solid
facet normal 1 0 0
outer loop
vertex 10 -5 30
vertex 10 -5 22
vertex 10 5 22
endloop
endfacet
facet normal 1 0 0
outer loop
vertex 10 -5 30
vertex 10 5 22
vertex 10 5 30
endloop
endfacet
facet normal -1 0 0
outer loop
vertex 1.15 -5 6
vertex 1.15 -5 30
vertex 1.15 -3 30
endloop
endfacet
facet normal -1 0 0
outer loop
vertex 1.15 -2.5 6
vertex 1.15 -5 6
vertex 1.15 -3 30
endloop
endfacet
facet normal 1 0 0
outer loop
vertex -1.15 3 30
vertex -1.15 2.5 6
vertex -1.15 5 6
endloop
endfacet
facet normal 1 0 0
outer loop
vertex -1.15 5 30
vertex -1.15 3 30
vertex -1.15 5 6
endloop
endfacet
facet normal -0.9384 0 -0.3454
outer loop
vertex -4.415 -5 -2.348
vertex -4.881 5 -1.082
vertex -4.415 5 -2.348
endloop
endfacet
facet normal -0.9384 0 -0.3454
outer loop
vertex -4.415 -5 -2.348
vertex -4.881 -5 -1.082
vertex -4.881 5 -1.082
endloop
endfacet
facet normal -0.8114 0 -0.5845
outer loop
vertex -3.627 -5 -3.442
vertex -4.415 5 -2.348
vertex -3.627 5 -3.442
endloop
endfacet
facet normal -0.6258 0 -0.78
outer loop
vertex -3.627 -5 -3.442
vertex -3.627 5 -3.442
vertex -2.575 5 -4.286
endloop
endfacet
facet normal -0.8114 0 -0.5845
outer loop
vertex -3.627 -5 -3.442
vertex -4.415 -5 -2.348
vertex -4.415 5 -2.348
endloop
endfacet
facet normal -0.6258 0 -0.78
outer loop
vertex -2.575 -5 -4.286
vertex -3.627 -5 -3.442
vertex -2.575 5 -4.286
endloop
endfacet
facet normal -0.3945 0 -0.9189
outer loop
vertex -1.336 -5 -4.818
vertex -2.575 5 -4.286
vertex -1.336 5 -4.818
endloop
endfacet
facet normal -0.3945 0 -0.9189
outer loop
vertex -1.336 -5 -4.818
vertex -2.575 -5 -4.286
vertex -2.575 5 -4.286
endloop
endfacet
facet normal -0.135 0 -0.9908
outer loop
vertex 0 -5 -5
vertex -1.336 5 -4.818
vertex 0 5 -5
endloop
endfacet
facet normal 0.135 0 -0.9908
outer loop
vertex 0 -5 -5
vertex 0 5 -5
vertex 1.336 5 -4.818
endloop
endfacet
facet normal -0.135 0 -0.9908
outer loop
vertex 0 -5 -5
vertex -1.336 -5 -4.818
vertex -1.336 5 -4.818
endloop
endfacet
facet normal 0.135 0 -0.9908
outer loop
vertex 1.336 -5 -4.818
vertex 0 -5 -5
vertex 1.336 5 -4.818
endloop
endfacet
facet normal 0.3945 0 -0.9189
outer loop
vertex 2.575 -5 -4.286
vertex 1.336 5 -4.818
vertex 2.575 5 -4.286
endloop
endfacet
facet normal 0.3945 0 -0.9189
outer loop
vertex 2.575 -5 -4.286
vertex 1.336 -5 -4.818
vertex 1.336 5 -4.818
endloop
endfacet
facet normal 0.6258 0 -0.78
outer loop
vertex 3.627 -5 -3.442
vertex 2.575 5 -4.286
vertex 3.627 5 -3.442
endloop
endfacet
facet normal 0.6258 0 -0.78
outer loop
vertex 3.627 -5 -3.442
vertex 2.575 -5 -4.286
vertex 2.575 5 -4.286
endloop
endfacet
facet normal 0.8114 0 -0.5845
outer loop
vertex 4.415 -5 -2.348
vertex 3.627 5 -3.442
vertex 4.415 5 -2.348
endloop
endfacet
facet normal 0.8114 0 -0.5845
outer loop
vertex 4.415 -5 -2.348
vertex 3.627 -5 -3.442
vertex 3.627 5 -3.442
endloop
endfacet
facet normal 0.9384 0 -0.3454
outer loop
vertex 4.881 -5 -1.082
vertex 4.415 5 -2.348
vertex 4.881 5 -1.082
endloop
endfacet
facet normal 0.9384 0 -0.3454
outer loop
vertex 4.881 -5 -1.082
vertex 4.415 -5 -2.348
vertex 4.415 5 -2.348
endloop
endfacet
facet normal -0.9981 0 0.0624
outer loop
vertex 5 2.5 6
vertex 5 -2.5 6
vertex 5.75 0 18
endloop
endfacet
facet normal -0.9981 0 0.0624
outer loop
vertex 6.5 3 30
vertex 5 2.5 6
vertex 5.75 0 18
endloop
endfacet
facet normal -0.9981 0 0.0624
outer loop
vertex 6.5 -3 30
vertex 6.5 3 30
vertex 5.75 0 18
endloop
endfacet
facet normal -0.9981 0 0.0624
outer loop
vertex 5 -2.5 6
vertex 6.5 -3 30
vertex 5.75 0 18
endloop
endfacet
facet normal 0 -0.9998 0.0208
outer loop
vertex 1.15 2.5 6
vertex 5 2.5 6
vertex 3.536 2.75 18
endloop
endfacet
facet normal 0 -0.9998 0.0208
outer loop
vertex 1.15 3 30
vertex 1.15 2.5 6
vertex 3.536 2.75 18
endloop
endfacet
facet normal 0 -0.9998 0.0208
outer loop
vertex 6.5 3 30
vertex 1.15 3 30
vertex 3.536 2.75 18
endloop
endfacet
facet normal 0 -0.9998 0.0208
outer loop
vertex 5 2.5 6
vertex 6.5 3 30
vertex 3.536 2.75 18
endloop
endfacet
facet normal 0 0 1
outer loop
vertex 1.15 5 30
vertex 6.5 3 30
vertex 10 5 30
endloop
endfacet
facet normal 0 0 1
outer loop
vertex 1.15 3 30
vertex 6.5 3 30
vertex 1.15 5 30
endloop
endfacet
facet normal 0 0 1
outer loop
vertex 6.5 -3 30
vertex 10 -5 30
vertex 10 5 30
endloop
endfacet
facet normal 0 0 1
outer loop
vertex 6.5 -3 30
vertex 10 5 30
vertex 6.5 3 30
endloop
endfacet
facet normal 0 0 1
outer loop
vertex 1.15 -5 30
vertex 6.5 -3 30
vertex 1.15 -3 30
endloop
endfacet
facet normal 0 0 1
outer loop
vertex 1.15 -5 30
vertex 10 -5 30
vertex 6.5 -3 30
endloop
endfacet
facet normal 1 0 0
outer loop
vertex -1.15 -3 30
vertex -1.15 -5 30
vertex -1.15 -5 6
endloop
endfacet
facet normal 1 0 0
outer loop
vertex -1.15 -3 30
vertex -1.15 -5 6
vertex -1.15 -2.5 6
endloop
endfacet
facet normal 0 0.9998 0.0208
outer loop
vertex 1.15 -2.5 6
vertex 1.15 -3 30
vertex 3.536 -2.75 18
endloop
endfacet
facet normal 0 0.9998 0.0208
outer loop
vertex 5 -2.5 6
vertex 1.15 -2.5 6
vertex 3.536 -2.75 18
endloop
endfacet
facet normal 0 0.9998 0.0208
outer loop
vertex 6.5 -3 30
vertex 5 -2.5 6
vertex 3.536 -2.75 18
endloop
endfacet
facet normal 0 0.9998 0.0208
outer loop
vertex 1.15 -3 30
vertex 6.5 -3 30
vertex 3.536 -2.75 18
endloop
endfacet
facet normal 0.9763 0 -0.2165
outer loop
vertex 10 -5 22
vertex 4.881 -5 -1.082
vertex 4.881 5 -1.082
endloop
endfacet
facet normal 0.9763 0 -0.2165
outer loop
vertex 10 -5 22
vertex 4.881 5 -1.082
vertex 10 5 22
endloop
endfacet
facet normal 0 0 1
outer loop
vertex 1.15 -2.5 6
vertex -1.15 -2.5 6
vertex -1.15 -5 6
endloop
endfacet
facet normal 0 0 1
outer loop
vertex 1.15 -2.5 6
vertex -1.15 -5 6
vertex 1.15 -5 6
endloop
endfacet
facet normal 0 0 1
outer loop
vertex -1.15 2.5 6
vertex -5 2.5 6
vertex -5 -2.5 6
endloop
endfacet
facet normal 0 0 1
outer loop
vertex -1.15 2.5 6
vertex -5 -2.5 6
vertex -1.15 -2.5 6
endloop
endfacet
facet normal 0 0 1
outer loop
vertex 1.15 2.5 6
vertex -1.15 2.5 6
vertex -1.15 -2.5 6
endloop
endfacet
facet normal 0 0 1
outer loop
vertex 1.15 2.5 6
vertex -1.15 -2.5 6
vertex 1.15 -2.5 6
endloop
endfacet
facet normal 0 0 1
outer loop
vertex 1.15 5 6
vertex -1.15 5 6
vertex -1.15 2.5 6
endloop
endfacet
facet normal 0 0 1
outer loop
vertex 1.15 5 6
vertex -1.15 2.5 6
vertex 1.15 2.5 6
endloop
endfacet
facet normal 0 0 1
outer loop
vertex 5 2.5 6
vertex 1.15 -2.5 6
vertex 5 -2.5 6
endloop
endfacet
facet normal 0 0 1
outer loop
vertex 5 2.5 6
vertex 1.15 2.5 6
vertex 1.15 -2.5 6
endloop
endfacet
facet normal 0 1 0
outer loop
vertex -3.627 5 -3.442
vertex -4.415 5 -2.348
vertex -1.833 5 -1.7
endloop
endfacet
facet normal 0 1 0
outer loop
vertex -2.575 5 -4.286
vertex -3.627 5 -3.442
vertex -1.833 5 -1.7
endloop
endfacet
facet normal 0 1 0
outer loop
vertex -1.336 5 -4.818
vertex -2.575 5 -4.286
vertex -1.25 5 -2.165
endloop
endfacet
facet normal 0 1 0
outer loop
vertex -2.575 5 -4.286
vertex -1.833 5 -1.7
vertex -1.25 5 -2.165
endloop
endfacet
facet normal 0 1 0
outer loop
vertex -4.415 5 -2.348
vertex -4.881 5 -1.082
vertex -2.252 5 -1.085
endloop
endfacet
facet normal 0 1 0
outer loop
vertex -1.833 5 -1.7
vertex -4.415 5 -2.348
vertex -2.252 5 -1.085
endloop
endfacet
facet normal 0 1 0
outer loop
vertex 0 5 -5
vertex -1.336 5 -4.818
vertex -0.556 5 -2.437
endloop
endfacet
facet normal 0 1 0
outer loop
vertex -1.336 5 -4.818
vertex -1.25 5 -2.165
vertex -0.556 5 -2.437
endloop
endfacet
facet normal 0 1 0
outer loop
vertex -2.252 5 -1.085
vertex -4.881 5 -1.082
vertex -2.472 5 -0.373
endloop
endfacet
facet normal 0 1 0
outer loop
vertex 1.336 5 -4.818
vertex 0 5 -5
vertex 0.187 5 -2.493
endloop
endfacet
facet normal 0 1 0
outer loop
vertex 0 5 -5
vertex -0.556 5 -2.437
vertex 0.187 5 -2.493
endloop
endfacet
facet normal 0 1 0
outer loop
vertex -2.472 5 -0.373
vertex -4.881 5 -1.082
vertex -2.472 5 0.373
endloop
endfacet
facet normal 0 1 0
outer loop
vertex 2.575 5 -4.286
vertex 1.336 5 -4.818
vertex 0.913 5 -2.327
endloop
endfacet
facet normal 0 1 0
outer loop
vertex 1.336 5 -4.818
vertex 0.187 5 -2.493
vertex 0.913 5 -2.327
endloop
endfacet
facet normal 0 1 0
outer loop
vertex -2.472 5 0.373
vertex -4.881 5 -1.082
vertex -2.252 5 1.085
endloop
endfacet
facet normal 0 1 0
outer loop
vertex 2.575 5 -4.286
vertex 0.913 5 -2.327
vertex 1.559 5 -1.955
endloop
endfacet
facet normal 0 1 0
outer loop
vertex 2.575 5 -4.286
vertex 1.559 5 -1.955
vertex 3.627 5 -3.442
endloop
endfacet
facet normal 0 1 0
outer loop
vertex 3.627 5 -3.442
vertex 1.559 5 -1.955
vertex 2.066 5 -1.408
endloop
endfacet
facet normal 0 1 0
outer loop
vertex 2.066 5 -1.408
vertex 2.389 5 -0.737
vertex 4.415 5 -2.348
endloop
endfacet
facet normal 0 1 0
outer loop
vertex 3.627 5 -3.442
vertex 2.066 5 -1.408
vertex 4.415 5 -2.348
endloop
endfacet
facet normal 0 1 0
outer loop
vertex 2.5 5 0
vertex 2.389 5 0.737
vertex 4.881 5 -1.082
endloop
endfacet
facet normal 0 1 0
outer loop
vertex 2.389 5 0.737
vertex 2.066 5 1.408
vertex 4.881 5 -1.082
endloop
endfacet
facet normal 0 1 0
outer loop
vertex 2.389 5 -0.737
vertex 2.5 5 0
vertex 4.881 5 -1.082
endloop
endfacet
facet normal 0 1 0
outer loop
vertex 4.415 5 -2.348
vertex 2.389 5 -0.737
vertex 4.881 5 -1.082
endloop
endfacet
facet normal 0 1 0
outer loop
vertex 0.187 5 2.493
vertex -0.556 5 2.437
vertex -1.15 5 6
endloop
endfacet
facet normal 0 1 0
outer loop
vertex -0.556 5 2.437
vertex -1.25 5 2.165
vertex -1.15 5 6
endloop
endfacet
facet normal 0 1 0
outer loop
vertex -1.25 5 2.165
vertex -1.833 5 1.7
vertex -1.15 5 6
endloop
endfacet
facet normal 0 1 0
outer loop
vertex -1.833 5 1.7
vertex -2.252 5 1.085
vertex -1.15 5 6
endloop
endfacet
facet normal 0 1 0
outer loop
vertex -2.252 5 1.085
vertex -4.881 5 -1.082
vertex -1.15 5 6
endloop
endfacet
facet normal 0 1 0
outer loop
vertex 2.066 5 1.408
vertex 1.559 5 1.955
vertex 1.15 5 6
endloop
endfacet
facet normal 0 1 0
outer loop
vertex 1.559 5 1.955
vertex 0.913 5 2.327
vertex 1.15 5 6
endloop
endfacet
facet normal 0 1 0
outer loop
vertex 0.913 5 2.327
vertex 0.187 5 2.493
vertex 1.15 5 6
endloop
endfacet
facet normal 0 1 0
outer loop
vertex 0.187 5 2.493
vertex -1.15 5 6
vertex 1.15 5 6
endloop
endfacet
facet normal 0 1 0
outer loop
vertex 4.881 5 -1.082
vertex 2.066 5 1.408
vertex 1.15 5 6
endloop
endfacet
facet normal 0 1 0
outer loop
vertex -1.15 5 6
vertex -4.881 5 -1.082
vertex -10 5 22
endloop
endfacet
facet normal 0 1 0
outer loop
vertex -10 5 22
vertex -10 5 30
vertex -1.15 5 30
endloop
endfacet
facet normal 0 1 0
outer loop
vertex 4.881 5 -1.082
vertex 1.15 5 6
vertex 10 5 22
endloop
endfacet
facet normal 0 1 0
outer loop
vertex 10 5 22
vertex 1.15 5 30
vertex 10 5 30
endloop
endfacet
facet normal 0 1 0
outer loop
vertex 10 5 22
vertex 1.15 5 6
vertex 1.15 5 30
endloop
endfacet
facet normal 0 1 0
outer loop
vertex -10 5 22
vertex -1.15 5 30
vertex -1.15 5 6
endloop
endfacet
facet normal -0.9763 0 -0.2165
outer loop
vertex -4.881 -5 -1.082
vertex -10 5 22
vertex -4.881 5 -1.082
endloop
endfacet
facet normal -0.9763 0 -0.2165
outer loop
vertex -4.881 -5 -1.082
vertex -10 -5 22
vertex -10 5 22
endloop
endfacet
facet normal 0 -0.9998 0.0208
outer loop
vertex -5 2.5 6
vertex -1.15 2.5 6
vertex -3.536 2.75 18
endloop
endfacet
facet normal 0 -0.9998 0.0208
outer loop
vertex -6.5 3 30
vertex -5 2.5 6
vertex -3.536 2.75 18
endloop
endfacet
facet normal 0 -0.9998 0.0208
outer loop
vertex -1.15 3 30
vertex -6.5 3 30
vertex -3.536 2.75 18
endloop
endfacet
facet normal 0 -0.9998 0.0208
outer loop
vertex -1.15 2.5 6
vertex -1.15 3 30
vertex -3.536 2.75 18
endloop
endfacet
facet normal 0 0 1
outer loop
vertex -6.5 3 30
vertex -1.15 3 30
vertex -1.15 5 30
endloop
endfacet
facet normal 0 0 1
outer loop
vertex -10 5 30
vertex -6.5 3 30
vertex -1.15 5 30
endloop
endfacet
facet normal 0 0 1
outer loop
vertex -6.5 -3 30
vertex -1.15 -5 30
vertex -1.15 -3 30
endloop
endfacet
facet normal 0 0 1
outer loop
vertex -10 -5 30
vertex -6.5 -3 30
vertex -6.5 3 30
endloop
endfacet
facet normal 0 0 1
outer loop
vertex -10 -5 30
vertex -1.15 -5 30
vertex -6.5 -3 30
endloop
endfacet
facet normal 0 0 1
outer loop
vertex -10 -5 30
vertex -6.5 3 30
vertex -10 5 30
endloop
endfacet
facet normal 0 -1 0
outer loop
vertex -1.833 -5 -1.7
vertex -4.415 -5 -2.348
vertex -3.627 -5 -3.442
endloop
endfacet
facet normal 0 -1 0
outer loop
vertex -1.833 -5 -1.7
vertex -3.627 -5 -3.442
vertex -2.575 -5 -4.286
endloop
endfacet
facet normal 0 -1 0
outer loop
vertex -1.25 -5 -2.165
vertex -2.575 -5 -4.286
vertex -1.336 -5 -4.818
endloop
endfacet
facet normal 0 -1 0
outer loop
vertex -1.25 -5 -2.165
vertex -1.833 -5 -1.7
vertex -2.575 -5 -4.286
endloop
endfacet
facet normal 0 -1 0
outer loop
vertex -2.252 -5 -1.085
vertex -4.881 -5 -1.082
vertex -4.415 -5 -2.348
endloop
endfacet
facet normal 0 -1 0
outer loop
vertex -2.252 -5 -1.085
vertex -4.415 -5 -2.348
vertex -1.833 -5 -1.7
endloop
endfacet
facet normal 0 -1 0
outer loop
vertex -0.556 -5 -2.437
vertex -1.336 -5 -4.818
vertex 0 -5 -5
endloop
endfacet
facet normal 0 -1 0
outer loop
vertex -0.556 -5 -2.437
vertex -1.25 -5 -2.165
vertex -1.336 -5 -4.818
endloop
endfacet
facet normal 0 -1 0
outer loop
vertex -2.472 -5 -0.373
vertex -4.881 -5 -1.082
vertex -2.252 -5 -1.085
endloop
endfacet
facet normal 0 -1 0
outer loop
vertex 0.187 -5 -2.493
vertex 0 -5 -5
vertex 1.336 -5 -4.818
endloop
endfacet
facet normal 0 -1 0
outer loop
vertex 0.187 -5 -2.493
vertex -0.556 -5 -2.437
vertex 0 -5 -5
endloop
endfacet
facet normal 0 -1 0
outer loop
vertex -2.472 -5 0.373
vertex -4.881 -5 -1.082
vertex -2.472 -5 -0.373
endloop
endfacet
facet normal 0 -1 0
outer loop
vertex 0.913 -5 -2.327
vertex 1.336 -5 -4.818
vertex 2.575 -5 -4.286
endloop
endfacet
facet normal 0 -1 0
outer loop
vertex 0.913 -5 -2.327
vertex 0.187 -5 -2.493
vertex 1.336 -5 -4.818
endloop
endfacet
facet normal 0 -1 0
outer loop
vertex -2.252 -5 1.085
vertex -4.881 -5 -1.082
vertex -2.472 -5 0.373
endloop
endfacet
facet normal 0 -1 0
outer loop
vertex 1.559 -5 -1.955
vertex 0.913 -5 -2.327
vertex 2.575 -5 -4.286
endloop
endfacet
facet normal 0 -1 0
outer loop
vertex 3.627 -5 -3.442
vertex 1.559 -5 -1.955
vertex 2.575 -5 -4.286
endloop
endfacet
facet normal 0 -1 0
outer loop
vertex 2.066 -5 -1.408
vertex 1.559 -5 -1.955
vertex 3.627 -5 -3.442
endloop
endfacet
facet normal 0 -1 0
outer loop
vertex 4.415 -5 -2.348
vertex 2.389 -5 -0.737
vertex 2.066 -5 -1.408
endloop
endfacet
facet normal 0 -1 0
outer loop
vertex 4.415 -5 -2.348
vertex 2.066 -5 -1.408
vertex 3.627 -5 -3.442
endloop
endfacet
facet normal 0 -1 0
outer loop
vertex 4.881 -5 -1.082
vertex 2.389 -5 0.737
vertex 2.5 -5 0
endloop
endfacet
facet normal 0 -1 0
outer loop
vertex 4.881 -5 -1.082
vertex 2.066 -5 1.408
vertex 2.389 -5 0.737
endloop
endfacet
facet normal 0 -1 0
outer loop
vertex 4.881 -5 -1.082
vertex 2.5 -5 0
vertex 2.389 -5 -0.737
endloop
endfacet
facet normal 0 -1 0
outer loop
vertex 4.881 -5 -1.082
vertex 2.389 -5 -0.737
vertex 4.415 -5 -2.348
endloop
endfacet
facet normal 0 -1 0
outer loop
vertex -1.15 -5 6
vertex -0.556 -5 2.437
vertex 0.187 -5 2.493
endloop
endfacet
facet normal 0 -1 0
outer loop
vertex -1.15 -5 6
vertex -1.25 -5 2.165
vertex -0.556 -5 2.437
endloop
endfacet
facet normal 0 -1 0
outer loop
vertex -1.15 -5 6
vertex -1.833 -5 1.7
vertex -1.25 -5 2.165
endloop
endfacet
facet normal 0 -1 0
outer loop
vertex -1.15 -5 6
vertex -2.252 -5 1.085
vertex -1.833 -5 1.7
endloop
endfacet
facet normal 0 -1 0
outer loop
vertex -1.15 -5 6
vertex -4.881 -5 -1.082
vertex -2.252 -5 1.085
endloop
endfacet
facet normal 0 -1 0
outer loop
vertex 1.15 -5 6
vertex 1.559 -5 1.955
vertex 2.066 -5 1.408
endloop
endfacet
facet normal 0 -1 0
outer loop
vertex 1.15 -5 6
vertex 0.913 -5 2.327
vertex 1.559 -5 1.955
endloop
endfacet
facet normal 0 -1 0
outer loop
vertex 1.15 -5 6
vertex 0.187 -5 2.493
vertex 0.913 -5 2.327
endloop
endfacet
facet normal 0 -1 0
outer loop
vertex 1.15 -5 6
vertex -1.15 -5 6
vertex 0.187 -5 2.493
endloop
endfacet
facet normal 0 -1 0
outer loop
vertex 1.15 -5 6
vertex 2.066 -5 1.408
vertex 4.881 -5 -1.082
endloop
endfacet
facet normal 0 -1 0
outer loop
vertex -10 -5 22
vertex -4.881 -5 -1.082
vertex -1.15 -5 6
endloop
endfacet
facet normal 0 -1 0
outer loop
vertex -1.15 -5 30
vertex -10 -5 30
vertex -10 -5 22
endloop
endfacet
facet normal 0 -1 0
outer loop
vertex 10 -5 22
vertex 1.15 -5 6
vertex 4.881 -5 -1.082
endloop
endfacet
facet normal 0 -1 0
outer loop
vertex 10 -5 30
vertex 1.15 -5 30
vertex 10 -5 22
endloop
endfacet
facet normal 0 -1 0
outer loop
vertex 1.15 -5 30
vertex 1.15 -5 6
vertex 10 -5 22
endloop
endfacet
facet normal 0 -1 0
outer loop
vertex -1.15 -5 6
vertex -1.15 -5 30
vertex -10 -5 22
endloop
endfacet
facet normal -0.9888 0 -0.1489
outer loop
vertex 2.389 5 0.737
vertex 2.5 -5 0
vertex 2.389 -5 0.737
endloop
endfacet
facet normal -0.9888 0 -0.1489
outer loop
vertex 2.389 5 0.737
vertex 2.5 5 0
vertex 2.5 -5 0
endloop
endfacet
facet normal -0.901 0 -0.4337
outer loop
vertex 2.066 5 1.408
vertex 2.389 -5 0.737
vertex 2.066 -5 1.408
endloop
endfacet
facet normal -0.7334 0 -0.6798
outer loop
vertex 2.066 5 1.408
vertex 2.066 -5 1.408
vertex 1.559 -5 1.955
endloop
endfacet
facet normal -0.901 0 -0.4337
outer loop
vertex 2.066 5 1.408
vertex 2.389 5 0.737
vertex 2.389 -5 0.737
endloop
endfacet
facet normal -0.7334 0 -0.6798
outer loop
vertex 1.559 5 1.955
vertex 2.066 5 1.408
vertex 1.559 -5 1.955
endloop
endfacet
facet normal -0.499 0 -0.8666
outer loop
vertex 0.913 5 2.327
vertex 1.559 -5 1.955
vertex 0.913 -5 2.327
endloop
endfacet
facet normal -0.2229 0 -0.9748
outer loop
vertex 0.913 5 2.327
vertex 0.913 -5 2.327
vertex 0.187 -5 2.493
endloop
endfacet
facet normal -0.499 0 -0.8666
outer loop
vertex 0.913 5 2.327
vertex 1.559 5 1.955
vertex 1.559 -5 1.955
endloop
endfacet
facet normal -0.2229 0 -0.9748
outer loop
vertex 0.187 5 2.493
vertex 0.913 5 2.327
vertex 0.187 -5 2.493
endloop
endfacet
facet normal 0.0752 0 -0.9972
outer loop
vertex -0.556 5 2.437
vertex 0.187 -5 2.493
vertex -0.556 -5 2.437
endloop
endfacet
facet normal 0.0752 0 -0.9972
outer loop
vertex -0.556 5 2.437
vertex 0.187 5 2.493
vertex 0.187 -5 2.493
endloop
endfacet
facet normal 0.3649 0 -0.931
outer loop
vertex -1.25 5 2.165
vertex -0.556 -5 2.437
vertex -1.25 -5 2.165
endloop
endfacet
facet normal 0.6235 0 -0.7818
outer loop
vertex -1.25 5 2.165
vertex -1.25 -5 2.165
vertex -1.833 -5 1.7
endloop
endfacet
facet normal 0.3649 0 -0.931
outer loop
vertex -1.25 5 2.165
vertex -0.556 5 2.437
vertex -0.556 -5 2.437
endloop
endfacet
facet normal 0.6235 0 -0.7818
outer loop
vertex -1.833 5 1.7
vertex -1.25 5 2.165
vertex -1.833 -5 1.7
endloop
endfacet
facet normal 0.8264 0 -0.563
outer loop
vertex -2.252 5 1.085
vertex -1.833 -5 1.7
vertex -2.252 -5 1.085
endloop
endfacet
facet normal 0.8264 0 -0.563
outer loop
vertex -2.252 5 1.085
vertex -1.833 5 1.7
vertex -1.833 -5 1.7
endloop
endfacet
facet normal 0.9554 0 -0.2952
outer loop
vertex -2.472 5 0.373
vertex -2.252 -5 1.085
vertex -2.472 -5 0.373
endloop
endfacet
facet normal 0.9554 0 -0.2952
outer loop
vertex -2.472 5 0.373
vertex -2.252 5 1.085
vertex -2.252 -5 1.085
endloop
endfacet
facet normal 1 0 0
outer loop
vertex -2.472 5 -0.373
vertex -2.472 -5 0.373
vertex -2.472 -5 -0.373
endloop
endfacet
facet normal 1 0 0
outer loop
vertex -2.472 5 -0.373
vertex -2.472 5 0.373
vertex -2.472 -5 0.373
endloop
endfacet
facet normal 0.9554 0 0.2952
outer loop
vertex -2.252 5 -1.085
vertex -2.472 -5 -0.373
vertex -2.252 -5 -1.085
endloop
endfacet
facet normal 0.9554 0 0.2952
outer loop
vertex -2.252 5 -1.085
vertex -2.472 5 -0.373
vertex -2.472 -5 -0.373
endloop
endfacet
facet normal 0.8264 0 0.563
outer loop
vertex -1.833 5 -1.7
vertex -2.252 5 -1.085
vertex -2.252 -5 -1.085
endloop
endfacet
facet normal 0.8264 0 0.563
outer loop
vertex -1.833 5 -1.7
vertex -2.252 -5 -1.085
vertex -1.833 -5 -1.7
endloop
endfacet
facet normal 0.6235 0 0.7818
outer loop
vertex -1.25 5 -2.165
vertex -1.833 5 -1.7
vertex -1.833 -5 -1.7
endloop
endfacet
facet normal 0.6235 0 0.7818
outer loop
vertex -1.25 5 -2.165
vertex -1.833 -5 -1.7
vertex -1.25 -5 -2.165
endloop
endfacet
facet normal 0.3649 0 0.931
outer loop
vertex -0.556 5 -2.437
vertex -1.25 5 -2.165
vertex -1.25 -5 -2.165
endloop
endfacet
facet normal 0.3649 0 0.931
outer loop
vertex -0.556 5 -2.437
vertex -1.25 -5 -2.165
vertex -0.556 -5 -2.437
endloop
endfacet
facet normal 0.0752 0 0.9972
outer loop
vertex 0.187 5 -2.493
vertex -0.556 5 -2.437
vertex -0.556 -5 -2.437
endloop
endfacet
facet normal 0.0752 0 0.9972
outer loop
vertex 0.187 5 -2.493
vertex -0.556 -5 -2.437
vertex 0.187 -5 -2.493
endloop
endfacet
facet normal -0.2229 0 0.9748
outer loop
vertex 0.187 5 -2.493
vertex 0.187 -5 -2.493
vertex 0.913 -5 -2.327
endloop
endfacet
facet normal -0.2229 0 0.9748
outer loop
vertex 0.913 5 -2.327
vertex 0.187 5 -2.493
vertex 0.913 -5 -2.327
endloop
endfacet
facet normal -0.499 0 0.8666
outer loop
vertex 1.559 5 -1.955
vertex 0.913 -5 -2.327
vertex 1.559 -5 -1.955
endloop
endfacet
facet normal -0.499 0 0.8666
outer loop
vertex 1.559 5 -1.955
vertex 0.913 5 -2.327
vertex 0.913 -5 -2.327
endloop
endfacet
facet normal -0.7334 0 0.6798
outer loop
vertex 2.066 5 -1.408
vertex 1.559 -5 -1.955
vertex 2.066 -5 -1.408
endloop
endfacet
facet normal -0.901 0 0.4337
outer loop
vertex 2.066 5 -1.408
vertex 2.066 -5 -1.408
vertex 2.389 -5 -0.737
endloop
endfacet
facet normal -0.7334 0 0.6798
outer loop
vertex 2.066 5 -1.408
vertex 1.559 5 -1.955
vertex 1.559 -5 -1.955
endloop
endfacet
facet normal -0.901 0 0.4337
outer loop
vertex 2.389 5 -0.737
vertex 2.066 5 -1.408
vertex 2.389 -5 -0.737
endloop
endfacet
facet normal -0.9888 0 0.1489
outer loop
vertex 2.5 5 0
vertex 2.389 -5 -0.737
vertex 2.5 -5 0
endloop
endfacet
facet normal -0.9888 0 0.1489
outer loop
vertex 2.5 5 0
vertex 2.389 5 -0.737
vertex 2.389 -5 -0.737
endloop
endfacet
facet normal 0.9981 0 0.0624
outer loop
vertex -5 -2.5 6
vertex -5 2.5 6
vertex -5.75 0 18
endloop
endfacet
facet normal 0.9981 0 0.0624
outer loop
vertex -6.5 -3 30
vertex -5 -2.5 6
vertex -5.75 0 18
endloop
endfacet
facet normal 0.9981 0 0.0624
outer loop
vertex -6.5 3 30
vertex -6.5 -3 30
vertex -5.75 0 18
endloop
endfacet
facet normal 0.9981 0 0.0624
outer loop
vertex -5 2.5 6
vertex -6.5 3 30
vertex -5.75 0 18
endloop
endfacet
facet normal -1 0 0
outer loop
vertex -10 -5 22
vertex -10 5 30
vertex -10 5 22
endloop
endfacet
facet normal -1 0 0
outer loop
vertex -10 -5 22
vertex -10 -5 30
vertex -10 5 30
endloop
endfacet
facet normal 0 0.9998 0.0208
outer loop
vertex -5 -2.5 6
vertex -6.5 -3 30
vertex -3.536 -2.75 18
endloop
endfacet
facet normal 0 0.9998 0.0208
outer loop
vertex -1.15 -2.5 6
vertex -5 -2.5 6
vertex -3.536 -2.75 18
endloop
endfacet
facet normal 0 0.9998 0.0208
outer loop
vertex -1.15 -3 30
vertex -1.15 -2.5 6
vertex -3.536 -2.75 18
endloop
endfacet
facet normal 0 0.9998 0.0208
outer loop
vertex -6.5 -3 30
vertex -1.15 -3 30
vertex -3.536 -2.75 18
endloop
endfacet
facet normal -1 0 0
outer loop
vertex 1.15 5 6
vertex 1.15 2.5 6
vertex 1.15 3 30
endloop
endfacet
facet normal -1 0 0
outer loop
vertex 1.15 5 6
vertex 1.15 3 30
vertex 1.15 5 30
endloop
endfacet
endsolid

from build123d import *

# Parameters (mm, degrees)
F0_R     = 2.5
F1_DEPTH = 5
F2_W     = 2.3
F2_H     = 10
F3_DEPTH = 24
F5_W     = 10
F5_H     = 5
F7_W     = 13
F7_H     = 6


with BuildPart() as f1:
    # F0 (on Front) → F1 (new body, symmetric)
    with BuildSketch(Plane.XZ):
        with BuildLine():
            ThreePointArc((-4.881421, -1.082464), (0, -5), (4.881421, -1.082464))
            Line((4.881421, -1.082464), (10, 22))
            Line((10, 22), (10, 30))
            Line((10, 30), (-10, 30))
            Line((-10, 30), (-10, 22))
            Line((-10, 22), (-4.881421, -1.082464))
        make_face()
        Circle(F0_R, mode=Mode.SUBTRACT)
    extrude(amount=F1_DEPTH, both=True)

    # F2 (on face) → F3 (cut)
    with BuildSketch(Plane.XY.offset(30)):
        Rectangle(F2_W, F2_H)
    extrude(amount=-F3_DEPTH, mode=Mode.SUBTRACT)

    # F5 (on offset) → F8 section 0
    with BuildSketch(Plane.XY.offset(6)):
        Rectangle(F5_W, F5_H)
    # F7 (on offset) → F8 section 1
    with BuildSketch(Plane.XY.offset(30)):
        Rectangle(F7_W, F7_H)
    loft(mode=Mode.SUBTRACT)


solid = f1.part
